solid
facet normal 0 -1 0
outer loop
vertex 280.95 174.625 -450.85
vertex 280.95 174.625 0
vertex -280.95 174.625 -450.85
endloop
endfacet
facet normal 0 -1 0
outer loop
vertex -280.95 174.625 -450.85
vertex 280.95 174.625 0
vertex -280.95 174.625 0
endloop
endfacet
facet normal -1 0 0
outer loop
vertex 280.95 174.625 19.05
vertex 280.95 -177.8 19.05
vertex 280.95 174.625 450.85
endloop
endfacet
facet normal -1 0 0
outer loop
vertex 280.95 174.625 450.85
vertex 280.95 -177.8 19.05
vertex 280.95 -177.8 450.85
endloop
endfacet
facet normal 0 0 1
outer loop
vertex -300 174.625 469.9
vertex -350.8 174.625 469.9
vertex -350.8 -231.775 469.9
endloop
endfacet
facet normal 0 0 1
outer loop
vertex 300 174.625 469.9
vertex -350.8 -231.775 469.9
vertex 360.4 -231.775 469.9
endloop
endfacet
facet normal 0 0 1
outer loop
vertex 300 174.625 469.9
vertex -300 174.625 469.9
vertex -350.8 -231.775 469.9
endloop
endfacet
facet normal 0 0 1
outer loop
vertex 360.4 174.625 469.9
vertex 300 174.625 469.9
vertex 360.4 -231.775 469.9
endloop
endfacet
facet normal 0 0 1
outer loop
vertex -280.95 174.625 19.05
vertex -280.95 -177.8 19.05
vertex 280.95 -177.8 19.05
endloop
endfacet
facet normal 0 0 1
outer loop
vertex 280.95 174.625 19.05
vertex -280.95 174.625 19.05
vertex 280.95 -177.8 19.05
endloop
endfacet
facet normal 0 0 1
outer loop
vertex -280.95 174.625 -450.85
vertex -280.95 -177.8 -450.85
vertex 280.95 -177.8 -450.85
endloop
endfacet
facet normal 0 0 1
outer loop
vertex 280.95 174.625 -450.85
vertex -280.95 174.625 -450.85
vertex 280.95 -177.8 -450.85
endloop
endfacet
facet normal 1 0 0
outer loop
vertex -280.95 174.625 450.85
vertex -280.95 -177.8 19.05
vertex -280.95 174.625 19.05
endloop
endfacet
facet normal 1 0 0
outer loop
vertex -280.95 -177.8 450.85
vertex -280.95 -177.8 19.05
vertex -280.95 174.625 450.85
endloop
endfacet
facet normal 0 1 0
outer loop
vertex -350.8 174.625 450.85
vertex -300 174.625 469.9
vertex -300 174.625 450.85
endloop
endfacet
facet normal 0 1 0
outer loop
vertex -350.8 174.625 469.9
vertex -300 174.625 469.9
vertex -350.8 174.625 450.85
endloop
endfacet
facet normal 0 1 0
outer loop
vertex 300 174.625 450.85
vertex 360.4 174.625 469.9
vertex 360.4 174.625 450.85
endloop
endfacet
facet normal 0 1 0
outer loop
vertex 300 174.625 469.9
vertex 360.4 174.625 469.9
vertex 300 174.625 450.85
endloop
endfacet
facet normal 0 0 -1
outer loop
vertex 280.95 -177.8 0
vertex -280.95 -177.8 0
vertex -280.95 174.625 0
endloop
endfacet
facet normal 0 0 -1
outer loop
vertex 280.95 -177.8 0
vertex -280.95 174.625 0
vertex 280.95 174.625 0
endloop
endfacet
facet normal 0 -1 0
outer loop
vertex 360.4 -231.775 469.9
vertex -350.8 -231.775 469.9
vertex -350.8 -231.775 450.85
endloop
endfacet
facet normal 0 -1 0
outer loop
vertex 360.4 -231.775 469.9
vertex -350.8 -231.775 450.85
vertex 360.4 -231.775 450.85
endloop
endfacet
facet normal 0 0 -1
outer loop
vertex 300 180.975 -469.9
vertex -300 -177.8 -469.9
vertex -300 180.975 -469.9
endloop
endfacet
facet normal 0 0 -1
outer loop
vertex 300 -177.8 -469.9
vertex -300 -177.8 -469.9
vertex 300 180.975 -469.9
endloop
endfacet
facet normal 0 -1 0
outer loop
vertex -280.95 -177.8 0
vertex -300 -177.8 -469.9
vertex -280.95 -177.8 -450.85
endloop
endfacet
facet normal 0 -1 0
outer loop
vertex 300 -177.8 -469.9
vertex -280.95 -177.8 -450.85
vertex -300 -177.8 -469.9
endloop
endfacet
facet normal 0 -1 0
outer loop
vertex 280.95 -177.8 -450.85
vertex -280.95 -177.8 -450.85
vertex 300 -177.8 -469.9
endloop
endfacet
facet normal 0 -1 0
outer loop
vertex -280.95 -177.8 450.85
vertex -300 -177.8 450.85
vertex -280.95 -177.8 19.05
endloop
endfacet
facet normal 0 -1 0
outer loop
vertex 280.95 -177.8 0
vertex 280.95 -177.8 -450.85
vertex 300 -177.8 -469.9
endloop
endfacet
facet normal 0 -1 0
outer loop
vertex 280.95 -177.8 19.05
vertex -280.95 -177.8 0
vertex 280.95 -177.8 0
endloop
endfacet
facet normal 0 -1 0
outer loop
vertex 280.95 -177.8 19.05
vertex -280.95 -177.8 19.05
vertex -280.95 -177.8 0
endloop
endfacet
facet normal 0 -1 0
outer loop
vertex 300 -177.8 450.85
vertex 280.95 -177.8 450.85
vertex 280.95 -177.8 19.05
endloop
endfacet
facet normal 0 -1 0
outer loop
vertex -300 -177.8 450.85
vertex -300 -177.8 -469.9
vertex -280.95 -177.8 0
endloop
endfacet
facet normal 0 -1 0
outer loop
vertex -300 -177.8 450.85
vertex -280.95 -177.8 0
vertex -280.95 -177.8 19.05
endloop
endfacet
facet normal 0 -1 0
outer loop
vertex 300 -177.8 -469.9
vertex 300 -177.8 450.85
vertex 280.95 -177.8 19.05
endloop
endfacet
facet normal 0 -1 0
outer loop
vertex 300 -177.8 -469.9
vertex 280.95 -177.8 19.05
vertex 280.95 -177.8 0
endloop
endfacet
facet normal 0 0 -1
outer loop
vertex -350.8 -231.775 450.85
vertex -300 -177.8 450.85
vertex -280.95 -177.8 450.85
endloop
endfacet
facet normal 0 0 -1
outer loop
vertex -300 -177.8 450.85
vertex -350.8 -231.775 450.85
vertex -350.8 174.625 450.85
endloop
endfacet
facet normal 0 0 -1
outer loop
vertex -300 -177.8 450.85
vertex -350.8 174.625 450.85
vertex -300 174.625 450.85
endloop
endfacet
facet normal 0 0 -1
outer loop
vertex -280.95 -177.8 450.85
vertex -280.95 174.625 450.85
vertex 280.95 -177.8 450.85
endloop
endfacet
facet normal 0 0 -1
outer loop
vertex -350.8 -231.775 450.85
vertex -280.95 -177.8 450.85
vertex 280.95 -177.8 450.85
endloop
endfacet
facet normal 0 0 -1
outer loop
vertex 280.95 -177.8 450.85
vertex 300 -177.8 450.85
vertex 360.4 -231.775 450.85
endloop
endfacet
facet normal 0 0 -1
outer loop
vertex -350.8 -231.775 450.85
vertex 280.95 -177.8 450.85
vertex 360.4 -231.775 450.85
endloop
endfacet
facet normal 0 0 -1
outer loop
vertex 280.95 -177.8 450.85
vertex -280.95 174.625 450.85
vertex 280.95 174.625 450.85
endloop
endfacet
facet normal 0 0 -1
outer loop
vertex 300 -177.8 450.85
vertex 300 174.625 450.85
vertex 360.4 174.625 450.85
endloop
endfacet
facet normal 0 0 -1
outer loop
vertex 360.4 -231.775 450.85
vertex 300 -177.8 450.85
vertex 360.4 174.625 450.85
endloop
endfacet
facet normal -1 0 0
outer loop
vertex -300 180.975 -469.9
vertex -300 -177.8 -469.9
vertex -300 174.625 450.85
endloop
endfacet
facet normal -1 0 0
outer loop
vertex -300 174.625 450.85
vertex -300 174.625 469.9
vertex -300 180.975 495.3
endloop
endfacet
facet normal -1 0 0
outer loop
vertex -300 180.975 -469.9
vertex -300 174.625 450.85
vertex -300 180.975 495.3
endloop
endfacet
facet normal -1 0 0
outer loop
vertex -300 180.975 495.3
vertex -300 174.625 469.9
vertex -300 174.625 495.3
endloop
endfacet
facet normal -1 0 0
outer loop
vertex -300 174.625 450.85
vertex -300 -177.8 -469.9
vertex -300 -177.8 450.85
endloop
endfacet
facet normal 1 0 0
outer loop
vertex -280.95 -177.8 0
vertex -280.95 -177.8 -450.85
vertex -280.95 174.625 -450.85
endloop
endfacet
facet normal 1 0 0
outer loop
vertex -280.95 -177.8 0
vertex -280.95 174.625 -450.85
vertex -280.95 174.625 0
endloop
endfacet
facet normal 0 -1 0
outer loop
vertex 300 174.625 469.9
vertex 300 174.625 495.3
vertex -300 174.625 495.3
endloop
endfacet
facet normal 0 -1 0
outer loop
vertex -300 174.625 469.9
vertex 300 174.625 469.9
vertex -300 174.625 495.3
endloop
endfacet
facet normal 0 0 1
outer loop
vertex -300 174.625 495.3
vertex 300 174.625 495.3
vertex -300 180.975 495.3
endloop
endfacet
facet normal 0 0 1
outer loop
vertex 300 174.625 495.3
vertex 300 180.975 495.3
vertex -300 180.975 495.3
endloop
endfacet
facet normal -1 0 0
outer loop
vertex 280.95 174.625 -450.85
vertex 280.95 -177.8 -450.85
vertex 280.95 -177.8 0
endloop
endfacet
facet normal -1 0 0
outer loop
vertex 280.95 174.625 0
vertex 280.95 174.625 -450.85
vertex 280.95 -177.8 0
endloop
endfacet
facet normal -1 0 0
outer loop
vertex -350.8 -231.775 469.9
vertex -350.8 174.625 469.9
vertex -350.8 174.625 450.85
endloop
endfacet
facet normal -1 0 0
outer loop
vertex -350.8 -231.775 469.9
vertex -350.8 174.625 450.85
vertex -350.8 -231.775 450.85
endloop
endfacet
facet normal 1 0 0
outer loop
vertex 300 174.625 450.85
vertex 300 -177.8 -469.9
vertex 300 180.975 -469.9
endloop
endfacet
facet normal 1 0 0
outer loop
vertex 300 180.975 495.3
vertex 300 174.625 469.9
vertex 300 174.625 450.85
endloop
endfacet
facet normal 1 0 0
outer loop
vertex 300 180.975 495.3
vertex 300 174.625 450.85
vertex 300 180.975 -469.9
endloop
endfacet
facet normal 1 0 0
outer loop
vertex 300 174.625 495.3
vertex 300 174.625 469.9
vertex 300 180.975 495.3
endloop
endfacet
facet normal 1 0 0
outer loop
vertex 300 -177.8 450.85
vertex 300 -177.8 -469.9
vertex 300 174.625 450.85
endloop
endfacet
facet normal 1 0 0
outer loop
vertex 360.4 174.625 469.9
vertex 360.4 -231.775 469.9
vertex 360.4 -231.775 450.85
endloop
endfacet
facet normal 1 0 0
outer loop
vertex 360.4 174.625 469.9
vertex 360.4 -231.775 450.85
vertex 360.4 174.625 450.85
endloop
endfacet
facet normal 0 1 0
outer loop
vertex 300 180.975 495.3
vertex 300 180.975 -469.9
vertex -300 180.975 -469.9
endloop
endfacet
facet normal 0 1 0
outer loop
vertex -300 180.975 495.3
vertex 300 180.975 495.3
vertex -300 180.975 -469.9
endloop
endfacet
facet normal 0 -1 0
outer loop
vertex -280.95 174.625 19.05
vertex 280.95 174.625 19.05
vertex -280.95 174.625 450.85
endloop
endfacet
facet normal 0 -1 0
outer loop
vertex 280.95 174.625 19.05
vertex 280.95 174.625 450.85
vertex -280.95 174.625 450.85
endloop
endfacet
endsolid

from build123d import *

# Parameters (mm, degrees)
F0_W     = 600
F0_H     = 939.8
F1_DEPTH = 177.8
F2_W     = 561.9
F2_H     = 431.8
F2_H_2   = 450.85
F3_DEPTH = 355.601
F4_W     = 600
F4_H     = 965.2
F5_DEPTH = 3.175
F7_DEPTH = 19.05


with BuildPart() as f1:
    # F0 (on Front) → F1 (new body, symmetric)
    with BuildSketch(Plane.XZ):
        Rectangle(F0_W, F0_H)
    extrude(amount=F1_DEPTH, both=True)

    # F2 (on face) → F3 (cut, through all)
    with BuildSketch(Plane.XZ.offset(177.8)):
        with Locations((0, 234.95)):
            Rectangle(F2_W, F2_H)
        with Locations((0, -225.425)):
            Rectangle(F2_W, F2_H_2)
    extrude(amount=-F3_DEPTH, mode=Mode.SUBTRACT)

    # F4 (on face) → F5 (join, symmetric)
    with BuildSketch(Plane(origin=(0, 177.8, 0), x_dir=(-1, 0, 0), z_dir=(0, 1, 0))):
        with Locations((0, 12.7)):
            Rectangle(F4_W, F4_H)
    extrude(amount=F5_DEPTH, both=True)

    # F6 (on face) → F7 (join)
    with BuildSketch(Plane.XY.offset(469.9)):
        Polygon((-350.8, 174.625), (-350.8, -231.775), (360.4, -231.775), (360.4, 174.625), (300, 174.625), (300, -177.8), (-300, -177.8), (-300, 174.625), align=None)
    extrude(amount=-F7_DEPTH)


solid = f1.part
